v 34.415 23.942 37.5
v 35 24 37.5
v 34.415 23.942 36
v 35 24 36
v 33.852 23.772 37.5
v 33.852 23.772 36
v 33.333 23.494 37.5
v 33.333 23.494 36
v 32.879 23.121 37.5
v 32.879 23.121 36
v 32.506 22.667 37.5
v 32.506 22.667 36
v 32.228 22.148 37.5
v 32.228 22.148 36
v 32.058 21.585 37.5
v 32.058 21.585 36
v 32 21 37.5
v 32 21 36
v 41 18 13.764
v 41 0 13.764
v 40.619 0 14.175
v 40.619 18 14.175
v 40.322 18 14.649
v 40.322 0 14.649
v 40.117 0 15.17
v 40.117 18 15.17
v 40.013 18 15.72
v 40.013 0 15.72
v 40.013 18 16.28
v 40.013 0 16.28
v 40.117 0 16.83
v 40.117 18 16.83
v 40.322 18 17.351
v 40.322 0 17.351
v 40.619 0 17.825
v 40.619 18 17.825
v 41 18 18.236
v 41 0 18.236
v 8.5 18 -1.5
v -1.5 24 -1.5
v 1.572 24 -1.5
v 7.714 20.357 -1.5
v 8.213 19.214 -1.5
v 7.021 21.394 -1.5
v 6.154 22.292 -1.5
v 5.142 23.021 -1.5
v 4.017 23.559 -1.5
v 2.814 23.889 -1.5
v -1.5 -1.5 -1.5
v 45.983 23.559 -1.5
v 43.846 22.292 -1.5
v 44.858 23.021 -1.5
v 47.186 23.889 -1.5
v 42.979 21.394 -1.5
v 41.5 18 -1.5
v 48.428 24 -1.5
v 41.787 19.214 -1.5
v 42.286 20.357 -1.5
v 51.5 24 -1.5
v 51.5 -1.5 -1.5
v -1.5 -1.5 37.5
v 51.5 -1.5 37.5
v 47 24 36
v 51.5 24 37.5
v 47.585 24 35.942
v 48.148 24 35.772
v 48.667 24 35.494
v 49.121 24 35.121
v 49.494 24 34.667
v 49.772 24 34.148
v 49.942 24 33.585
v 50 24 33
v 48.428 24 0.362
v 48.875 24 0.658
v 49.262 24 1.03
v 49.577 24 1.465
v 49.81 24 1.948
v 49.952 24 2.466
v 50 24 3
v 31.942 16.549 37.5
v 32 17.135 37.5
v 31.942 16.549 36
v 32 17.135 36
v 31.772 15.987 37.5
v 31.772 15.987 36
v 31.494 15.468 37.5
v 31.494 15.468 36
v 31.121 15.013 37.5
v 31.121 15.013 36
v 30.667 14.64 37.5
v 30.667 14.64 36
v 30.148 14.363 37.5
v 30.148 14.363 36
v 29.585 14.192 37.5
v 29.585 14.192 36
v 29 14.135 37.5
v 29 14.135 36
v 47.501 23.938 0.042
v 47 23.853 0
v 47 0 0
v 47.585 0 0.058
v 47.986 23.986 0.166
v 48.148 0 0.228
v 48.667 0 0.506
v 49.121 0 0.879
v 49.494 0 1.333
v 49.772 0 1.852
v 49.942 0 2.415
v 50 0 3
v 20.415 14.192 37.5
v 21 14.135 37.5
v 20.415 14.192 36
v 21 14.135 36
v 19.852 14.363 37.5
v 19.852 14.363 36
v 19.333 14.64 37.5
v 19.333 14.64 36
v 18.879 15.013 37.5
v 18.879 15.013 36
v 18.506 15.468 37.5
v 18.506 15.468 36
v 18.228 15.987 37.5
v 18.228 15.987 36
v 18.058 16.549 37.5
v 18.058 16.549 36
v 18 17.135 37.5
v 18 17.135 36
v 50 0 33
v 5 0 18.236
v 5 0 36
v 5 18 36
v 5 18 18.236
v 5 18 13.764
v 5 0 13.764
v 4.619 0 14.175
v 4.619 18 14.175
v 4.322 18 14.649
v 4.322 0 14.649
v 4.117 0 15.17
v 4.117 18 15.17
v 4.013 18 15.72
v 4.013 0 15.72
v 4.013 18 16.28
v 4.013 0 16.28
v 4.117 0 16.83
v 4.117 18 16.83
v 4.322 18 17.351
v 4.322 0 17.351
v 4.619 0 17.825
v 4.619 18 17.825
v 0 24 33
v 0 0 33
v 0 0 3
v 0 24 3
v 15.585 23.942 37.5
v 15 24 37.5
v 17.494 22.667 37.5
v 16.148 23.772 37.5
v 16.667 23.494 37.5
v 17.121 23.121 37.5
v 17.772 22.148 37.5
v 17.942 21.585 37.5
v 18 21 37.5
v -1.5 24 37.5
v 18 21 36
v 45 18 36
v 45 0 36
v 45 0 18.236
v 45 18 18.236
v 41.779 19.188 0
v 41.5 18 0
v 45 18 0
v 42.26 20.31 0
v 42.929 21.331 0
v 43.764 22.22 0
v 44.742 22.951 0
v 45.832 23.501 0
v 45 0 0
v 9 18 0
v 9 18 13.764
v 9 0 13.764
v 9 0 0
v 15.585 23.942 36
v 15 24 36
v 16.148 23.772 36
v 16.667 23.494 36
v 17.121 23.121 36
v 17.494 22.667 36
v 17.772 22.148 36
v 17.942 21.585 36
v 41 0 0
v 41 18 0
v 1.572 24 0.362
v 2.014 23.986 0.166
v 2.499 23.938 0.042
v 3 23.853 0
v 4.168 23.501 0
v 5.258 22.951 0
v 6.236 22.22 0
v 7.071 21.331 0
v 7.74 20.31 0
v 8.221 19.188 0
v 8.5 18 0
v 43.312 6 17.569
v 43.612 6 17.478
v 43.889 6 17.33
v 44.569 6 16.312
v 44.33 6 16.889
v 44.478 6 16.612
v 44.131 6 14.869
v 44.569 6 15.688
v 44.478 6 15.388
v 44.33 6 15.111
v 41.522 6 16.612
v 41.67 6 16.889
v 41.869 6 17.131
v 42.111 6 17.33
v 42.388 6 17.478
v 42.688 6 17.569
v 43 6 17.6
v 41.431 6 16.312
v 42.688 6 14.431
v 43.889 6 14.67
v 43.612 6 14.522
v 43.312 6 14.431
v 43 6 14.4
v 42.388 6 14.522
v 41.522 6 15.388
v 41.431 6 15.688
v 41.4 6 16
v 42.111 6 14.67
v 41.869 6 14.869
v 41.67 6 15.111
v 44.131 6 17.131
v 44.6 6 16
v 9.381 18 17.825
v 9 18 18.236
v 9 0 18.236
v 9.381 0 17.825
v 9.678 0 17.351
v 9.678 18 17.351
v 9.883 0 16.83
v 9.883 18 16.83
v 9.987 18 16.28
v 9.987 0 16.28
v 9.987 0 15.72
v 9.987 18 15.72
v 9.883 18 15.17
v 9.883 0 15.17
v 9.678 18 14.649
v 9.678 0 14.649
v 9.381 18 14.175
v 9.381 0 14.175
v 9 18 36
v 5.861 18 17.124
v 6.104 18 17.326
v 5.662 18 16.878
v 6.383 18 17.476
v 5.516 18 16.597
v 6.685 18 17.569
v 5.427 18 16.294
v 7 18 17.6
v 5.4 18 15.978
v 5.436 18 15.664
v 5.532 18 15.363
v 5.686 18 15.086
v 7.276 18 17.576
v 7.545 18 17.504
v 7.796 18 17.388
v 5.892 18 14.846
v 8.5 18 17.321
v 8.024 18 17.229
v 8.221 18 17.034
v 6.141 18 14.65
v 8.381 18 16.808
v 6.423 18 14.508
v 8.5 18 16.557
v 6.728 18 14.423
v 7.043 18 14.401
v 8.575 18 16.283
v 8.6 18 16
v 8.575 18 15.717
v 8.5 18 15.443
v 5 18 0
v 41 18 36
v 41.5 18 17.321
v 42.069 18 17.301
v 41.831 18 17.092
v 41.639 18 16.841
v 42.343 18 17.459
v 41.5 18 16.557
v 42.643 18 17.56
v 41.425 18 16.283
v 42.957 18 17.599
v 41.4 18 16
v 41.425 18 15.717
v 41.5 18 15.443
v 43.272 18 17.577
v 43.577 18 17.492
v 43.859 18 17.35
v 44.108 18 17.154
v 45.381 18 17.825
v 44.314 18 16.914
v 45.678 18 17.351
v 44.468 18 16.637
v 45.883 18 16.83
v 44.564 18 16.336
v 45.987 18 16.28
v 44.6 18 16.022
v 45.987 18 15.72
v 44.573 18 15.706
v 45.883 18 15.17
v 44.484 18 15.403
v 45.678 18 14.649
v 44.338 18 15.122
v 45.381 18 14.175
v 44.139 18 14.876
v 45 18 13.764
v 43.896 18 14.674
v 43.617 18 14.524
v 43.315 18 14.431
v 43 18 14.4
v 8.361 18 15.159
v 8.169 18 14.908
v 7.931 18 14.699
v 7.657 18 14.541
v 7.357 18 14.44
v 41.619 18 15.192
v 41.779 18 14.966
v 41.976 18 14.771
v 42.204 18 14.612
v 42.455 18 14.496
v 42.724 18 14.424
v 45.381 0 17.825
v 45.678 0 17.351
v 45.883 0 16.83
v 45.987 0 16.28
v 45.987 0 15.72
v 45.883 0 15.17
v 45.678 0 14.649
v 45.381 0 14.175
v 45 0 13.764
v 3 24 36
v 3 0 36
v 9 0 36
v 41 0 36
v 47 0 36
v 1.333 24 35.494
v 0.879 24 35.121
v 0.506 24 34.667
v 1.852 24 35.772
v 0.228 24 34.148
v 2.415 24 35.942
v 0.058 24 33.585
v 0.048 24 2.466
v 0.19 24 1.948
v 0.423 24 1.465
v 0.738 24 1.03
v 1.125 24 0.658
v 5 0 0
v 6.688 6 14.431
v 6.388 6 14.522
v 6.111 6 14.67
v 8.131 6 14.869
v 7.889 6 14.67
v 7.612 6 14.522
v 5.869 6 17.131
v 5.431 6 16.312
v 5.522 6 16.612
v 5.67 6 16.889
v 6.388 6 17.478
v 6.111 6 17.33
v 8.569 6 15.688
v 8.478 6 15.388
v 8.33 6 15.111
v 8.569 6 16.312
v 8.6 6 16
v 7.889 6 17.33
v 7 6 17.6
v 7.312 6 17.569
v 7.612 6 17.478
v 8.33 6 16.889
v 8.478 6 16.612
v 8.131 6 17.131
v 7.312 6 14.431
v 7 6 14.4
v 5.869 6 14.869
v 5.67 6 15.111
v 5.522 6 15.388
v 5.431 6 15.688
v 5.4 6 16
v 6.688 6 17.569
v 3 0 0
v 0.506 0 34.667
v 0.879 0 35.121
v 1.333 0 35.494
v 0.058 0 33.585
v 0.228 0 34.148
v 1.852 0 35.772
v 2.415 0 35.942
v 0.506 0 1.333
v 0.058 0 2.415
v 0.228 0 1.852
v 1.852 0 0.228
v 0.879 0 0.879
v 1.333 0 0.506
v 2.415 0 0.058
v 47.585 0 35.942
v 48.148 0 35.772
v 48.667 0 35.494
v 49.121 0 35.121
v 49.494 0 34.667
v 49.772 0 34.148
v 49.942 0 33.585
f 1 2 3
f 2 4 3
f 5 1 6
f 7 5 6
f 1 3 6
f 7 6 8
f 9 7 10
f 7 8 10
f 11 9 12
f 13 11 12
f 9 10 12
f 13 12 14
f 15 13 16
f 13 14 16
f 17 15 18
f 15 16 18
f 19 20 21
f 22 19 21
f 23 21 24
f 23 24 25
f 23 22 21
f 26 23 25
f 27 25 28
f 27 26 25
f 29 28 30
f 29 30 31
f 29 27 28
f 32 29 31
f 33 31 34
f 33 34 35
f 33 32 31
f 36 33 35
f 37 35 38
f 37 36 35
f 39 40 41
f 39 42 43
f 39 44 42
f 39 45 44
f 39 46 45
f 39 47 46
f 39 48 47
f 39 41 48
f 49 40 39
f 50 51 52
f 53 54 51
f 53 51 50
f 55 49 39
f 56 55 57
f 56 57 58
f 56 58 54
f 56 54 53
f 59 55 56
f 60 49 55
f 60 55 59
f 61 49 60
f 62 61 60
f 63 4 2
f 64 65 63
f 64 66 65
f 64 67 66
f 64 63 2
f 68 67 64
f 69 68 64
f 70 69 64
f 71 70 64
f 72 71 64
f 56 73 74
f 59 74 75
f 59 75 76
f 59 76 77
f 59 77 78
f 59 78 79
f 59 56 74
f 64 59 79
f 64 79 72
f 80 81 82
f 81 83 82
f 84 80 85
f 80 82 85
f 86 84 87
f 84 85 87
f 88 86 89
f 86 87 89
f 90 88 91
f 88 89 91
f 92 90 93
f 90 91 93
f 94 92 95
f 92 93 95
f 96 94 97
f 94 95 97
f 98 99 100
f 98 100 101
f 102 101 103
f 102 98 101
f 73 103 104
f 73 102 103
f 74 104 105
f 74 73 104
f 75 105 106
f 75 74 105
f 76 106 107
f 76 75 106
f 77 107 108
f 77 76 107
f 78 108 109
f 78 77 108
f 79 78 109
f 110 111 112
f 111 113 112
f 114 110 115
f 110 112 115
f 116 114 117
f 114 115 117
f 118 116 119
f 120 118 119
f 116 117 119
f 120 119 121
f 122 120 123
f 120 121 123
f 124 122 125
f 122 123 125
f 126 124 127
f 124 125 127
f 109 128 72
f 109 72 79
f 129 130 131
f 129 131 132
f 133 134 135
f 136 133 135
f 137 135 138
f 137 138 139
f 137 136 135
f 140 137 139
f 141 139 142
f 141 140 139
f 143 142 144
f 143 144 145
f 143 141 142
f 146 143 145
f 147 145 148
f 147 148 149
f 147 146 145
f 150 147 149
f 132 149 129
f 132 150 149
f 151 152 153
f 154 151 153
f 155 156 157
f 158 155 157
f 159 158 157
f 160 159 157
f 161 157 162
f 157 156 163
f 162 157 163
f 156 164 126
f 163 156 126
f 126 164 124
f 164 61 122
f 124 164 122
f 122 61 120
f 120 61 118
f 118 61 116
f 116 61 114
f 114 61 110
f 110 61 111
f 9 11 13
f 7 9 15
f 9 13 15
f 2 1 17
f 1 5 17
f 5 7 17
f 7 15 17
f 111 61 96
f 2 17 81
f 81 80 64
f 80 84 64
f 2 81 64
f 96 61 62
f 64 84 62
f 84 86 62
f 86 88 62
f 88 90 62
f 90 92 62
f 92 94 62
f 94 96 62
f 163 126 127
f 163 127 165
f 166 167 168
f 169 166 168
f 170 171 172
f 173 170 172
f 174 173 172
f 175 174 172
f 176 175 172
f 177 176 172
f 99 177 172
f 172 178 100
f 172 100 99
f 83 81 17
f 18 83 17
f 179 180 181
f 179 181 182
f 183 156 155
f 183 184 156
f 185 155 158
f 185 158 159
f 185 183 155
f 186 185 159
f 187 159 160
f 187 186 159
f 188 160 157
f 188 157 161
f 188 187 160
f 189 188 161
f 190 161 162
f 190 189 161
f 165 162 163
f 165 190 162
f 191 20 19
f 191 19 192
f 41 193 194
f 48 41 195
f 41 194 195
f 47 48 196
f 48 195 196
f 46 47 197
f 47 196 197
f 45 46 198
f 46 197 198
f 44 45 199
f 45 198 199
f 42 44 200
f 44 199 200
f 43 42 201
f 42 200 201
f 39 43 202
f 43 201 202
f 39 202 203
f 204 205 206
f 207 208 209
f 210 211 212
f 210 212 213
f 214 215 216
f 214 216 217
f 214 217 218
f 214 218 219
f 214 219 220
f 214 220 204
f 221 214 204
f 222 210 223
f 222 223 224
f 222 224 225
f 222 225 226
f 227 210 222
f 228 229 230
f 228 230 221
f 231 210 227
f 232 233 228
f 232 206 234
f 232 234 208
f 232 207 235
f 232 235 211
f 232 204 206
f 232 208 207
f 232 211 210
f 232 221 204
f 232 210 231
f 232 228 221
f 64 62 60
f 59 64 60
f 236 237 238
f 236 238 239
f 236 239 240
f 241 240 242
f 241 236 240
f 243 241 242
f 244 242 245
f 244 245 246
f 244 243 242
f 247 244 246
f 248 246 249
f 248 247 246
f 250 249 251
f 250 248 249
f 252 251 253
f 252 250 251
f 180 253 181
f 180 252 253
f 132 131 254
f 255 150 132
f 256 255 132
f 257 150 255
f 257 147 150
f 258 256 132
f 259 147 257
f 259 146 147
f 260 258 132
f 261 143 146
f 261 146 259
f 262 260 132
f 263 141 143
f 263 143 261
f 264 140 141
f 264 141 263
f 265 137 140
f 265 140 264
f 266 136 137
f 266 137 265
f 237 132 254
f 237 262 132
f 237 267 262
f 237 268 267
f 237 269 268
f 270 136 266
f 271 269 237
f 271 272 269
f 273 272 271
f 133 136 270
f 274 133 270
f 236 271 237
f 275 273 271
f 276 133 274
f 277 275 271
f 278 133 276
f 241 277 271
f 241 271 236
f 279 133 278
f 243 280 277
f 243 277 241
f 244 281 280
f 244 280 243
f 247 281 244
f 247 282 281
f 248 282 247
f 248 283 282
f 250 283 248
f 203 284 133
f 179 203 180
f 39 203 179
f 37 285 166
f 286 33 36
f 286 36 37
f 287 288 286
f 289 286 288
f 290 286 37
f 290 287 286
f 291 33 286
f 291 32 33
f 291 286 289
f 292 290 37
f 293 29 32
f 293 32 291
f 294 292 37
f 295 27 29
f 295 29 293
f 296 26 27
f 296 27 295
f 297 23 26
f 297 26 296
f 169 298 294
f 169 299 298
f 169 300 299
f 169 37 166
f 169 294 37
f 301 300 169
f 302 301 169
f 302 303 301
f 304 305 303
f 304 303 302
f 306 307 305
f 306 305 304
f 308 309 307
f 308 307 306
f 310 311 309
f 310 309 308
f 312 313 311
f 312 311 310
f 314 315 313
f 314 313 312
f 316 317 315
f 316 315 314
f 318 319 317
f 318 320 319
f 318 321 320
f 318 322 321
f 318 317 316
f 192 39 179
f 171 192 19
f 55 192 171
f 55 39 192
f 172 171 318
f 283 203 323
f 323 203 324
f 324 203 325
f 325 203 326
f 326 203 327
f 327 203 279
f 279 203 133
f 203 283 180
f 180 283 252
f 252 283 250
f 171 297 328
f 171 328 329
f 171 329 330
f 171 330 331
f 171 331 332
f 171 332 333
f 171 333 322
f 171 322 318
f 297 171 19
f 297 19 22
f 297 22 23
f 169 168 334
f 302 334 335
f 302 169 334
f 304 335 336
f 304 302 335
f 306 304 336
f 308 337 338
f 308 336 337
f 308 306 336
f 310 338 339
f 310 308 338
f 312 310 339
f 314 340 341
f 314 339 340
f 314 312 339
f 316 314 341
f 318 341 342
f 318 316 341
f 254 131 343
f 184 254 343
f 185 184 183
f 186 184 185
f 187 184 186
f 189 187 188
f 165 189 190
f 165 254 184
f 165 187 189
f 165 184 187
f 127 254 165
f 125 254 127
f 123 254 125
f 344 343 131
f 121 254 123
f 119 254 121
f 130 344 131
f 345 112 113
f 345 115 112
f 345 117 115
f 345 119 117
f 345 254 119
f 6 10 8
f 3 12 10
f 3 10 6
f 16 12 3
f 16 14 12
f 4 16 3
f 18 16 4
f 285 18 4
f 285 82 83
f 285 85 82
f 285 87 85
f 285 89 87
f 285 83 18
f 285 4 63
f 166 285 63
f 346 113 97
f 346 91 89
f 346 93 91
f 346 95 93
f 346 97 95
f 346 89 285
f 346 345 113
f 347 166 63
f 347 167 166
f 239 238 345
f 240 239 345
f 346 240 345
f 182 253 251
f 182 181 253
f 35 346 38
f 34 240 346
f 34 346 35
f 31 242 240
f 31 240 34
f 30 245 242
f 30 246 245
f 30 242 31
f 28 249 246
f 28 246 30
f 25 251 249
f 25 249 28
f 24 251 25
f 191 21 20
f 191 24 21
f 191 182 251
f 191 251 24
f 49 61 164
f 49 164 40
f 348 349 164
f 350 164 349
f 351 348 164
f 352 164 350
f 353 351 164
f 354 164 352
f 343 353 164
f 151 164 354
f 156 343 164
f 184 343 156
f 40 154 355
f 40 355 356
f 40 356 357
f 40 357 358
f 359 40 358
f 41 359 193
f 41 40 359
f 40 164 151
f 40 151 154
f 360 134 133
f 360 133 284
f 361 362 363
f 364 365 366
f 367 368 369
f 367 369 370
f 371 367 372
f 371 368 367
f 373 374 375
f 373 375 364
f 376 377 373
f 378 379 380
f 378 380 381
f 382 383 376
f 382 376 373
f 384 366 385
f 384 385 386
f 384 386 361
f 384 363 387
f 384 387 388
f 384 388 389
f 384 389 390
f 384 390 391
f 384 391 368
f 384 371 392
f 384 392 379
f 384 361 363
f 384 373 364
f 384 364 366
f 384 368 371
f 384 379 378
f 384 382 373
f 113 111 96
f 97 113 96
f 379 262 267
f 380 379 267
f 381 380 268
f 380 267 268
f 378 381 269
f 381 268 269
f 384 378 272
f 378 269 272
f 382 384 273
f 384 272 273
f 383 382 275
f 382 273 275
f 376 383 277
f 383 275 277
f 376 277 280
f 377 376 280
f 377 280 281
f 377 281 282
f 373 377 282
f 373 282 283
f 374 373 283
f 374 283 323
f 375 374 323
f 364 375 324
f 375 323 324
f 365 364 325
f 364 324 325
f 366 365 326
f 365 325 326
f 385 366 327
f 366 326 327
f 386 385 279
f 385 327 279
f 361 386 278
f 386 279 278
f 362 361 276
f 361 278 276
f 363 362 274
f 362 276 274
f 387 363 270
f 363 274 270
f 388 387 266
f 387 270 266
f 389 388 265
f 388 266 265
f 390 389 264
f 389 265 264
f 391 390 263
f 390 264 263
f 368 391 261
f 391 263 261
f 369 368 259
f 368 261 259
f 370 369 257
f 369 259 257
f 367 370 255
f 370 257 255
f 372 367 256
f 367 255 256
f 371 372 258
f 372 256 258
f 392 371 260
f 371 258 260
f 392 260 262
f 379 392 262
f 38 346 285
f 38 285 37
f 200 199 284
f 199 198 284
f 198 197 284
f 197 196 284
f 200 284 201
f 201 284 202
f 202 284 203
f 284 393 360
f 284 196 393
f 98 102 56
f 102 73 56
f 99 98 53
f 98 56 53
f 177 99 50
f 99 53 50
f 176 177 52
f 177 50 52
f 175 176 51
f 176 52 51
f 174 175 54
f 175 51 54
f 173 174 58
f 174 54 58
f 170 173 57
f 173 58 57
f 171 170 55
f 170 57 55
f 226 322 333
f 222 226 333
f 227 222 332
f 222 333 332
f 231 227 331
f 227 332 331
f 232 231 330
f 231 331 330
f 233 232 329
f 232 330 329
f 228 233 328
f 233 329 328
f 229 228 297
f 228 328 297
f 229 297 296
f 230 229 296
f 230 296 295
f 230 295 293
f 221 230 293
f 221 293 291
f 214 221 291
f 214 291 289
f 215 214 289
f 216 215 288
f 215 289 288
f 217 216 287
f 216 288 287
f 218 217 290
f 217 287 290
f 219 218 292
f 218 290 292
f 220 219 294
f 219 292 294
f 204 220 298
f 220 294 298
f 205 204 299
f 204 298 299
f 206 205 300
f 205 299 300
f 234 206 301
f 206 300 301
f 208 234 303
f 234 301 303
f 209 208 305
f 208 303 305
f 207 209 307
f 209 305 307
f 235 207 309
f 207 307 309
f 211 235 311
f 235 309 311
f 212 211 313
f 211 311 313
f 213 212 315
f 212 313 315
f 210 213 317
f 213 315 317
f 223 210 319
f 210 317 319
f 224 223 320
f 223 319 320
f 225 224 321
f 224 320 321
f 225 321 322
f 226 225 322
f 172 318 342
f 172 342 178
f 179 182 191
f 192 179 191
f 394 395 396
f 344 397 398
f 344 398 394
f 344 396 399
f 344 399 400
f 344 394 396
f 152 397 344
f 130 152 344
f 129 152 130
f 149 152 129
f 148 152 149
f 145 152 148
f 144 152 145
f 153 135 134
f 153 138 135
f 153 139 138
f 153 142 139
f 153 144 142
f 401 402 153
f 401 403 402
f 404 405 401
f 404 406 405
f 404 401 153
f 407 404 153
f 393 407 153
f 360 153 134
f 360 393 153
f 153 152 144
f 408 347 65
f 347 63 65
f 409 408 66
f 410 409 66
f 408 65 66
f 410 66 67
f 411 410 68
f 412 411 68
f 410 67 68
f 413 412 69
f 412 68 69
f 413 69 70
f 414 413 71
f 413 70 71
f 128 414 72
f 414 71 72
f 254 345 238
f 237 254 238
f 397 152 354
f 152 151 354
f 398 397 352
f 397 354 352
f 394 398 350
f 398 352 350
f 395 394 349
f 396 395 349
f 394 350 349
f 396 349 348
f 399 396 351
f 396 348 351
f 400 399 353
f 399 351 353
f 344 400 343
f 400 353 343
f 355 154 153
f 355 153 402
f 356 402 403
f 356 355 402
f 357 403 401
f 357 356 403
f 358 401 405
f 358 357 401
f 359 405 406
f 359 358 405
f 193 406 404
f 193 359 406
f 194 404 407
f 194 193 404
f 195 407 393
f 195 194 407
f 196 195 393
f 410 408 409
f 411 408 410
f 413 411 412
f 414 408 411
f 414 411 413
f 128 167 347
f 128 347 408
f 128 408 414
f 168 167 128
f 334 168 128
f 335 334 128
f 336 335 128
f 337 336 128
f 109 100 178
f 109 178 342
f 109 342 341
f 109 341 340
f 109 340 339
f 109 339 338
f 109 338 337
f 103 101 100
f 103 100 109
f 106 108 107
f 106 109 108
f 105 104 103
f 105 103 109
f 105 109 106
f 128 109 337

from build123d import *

# Parameters (mm, degrees)
SKETCH1_W           = 50
SKETCH1_H           = 36
BOSS_EXTRUDE1_DEPTH = 24
SHELL1_T            = 1.5
SKETCH2_W           = 4
SKETCH2_H           = 36
BOSS_EXTRUDE2_DEPTH = 18
SKETCH6_W           = 14
SKETCH6_H           = 14
CUT_EXTRUDE2_DEPTH  = 10
FILLET1_R           = 3
SKETCH4_R           = 3
BOSS_EXTRUDE3_DEPTH = 18
SKETCH7_R           = 1.6
CUT_EXTRUDE3_DEPTH  = 12
SKETCH8_W           = 33
SKETCH8_H           = 8
CUT_EXTRUDE4_DEPTH  = 5
FILLET3_R           = 7


with BuildPart() as part:
    # Sketch1 → Boss-Extrude1 (new body)
    with BuildSketch(Plane(origin=(0, 0, 0), x_dir=(1, 0, 0), z_dir=(0, 1, 0))):
        with Locations((25, -18)):
            Rectangle(SKETCH1_W, SKETCH1_H)
    extrude(amount=BOSS_EXTRUDE1_DEPTH)

    # Shell1
    shell1_openings = [part.faces().sort_by_distance(p)[0] for p in [
        (25, 24, 18),
    ]]
    offset(amount=SHELL1_T, openings=shell1_openings, kind=Kind.INTERSECTION)

    # Sketch2 → Boss-Extrude2 (add)
    with BuildSketch(Plane(origin=(0, 0, 0), x_dir=(1, 0, 0), z_dir=(0, 1, 0))):
        with Locations((7, -18)):
            Rectangle(SKETCH2_W, SKETCH2_H)
        with Locations((43, -18)):
            Rectangle(SKETCH2_W, SKETCH2_H)
    extrude(amount=BOSS_EXTRUDE2_DEPTH)

    # Sketch6 → Cut-Extrude2 (cut)
    with BuildSketch(Plane.XY.offset(37.5)):
        with Locations((25, 21.134691447)):
            Rectangle(SKETCH6_W, SKETCH6_H)
    extrude(amount=-CUT_EXTRUDE2_DEPTH, mode=Mode.SUBTRACT)

    # Fillet1
    fillet1_edges = [part.edges().sort_by_distance(p)[0] for p in [
        (0, 12, 0),
        (0, 12, 36),
        (50, 12, 36),
        (50, 12, 0),
        (32, 24, 36.75),
        (18, 24, 36.75),
        (18, 14.134691447, 36.75),
        (32, 14.134691447, 36.75),
    ]]
    fillet(fillet1_edges, radius=FILLET1_R)

    # Sketch4 → Boss-Extrude3 (add)
    with BuildSketch(Plane(origin=(0, 18, 0), x_dir=(1, 0, 0), z_dir=(0, 1, 0))):
        with Locations((7, -16)):
            Circle(SKETCH4_R)
        with Locations((43, -16)):
            Circle(SKETCH4_R)
    extrude(amount=-BOSS_EXTRUDE3_DEPTH)

    # Sketch7 → Cut-Extrude3 (cut)
    with BuildSketch(Plane(origin=(0, 18, 0), x_dir=(1, 0, 0), z_dir=(0, 1, 0))):
        with Locations(Location((7, -16, 0), (0, 0, 270))):
            Circle(SKETCH7_R)
        with Locations(Location((43, -16, 0), (0, 0, 90))):
            Circle(SKETCH7_R)
    extrude(amount=-CUT_EXTRUDE3_DEPTH, mode=Mode.SUBTRACT)

    # Sketch8 → Cut-Extrude4 (cut)
    with BuildSketch(Plane(origin=(0, 0, -1.5), x_dir=(-1, 0, 0), z_dir=(0, 0, -1))):
        with Locations((-25, 22)):
            Rectangle(SKETCH8_W, SKETCH8_H)
    extrude(amount=-CUT_EXTRUDE4_DEPTH, mode=Mode.SUBTRACT)

    # Fillet3
    # the kernel refuses this fillet: 7 mm, written as the material it takes off along each edge
    with BuildSketch(Plane(origin=(41.5, 24, -18.820508076), x_dir=(0, -1, 0), z_dir=(0, 0, 1))) as fillet3_piece_1:
        with BuildLine():
            CenterArc((7, 6.92820323), FILLET3_R, 180, 81.786789298)
            Line((0, 6.92820323), (-0.14, 6.92820323))
            Line((-0.14, 6.92820323), (-0.14, 0))
            Line((-0.14, 0), (0, -0.14))
            ThreePointArc((0, -0.14), (3, -0.14), (5.98, -0.138564065))
            Line((5.98, -0.138564065), (6, 0))
        make_face()
    extrude(amount=36.141016151, mode=Mode.SUBTRACT)
    with BuildSketch(Plane(origin=(8.5, 24, 17.320508076), x_dir=(-1, 0, 0), z_dir=(0, 0, -1))) as fillet3_piece_2:
        with BuildLine():
            CenterArc((6.92820323, -7), FILLET3_R, 90, 81.786789298)
            Line((0, -6), (-0.138564065, -5.98))
            ThreePointArc((-0.138564065, -5.98), (-0.14, -3), (-0.14, 0))
            Line((-0.14, 0), (0, 0.14))
            Line((0, 0.14), (6.92820323, 0.14))
            Line((6.92820323, 0.14), (6.92820323, 0))
        make_face()
    extrude(amount=36.141016151, mode=Mode.SUBTRACT)


solid = part.part
